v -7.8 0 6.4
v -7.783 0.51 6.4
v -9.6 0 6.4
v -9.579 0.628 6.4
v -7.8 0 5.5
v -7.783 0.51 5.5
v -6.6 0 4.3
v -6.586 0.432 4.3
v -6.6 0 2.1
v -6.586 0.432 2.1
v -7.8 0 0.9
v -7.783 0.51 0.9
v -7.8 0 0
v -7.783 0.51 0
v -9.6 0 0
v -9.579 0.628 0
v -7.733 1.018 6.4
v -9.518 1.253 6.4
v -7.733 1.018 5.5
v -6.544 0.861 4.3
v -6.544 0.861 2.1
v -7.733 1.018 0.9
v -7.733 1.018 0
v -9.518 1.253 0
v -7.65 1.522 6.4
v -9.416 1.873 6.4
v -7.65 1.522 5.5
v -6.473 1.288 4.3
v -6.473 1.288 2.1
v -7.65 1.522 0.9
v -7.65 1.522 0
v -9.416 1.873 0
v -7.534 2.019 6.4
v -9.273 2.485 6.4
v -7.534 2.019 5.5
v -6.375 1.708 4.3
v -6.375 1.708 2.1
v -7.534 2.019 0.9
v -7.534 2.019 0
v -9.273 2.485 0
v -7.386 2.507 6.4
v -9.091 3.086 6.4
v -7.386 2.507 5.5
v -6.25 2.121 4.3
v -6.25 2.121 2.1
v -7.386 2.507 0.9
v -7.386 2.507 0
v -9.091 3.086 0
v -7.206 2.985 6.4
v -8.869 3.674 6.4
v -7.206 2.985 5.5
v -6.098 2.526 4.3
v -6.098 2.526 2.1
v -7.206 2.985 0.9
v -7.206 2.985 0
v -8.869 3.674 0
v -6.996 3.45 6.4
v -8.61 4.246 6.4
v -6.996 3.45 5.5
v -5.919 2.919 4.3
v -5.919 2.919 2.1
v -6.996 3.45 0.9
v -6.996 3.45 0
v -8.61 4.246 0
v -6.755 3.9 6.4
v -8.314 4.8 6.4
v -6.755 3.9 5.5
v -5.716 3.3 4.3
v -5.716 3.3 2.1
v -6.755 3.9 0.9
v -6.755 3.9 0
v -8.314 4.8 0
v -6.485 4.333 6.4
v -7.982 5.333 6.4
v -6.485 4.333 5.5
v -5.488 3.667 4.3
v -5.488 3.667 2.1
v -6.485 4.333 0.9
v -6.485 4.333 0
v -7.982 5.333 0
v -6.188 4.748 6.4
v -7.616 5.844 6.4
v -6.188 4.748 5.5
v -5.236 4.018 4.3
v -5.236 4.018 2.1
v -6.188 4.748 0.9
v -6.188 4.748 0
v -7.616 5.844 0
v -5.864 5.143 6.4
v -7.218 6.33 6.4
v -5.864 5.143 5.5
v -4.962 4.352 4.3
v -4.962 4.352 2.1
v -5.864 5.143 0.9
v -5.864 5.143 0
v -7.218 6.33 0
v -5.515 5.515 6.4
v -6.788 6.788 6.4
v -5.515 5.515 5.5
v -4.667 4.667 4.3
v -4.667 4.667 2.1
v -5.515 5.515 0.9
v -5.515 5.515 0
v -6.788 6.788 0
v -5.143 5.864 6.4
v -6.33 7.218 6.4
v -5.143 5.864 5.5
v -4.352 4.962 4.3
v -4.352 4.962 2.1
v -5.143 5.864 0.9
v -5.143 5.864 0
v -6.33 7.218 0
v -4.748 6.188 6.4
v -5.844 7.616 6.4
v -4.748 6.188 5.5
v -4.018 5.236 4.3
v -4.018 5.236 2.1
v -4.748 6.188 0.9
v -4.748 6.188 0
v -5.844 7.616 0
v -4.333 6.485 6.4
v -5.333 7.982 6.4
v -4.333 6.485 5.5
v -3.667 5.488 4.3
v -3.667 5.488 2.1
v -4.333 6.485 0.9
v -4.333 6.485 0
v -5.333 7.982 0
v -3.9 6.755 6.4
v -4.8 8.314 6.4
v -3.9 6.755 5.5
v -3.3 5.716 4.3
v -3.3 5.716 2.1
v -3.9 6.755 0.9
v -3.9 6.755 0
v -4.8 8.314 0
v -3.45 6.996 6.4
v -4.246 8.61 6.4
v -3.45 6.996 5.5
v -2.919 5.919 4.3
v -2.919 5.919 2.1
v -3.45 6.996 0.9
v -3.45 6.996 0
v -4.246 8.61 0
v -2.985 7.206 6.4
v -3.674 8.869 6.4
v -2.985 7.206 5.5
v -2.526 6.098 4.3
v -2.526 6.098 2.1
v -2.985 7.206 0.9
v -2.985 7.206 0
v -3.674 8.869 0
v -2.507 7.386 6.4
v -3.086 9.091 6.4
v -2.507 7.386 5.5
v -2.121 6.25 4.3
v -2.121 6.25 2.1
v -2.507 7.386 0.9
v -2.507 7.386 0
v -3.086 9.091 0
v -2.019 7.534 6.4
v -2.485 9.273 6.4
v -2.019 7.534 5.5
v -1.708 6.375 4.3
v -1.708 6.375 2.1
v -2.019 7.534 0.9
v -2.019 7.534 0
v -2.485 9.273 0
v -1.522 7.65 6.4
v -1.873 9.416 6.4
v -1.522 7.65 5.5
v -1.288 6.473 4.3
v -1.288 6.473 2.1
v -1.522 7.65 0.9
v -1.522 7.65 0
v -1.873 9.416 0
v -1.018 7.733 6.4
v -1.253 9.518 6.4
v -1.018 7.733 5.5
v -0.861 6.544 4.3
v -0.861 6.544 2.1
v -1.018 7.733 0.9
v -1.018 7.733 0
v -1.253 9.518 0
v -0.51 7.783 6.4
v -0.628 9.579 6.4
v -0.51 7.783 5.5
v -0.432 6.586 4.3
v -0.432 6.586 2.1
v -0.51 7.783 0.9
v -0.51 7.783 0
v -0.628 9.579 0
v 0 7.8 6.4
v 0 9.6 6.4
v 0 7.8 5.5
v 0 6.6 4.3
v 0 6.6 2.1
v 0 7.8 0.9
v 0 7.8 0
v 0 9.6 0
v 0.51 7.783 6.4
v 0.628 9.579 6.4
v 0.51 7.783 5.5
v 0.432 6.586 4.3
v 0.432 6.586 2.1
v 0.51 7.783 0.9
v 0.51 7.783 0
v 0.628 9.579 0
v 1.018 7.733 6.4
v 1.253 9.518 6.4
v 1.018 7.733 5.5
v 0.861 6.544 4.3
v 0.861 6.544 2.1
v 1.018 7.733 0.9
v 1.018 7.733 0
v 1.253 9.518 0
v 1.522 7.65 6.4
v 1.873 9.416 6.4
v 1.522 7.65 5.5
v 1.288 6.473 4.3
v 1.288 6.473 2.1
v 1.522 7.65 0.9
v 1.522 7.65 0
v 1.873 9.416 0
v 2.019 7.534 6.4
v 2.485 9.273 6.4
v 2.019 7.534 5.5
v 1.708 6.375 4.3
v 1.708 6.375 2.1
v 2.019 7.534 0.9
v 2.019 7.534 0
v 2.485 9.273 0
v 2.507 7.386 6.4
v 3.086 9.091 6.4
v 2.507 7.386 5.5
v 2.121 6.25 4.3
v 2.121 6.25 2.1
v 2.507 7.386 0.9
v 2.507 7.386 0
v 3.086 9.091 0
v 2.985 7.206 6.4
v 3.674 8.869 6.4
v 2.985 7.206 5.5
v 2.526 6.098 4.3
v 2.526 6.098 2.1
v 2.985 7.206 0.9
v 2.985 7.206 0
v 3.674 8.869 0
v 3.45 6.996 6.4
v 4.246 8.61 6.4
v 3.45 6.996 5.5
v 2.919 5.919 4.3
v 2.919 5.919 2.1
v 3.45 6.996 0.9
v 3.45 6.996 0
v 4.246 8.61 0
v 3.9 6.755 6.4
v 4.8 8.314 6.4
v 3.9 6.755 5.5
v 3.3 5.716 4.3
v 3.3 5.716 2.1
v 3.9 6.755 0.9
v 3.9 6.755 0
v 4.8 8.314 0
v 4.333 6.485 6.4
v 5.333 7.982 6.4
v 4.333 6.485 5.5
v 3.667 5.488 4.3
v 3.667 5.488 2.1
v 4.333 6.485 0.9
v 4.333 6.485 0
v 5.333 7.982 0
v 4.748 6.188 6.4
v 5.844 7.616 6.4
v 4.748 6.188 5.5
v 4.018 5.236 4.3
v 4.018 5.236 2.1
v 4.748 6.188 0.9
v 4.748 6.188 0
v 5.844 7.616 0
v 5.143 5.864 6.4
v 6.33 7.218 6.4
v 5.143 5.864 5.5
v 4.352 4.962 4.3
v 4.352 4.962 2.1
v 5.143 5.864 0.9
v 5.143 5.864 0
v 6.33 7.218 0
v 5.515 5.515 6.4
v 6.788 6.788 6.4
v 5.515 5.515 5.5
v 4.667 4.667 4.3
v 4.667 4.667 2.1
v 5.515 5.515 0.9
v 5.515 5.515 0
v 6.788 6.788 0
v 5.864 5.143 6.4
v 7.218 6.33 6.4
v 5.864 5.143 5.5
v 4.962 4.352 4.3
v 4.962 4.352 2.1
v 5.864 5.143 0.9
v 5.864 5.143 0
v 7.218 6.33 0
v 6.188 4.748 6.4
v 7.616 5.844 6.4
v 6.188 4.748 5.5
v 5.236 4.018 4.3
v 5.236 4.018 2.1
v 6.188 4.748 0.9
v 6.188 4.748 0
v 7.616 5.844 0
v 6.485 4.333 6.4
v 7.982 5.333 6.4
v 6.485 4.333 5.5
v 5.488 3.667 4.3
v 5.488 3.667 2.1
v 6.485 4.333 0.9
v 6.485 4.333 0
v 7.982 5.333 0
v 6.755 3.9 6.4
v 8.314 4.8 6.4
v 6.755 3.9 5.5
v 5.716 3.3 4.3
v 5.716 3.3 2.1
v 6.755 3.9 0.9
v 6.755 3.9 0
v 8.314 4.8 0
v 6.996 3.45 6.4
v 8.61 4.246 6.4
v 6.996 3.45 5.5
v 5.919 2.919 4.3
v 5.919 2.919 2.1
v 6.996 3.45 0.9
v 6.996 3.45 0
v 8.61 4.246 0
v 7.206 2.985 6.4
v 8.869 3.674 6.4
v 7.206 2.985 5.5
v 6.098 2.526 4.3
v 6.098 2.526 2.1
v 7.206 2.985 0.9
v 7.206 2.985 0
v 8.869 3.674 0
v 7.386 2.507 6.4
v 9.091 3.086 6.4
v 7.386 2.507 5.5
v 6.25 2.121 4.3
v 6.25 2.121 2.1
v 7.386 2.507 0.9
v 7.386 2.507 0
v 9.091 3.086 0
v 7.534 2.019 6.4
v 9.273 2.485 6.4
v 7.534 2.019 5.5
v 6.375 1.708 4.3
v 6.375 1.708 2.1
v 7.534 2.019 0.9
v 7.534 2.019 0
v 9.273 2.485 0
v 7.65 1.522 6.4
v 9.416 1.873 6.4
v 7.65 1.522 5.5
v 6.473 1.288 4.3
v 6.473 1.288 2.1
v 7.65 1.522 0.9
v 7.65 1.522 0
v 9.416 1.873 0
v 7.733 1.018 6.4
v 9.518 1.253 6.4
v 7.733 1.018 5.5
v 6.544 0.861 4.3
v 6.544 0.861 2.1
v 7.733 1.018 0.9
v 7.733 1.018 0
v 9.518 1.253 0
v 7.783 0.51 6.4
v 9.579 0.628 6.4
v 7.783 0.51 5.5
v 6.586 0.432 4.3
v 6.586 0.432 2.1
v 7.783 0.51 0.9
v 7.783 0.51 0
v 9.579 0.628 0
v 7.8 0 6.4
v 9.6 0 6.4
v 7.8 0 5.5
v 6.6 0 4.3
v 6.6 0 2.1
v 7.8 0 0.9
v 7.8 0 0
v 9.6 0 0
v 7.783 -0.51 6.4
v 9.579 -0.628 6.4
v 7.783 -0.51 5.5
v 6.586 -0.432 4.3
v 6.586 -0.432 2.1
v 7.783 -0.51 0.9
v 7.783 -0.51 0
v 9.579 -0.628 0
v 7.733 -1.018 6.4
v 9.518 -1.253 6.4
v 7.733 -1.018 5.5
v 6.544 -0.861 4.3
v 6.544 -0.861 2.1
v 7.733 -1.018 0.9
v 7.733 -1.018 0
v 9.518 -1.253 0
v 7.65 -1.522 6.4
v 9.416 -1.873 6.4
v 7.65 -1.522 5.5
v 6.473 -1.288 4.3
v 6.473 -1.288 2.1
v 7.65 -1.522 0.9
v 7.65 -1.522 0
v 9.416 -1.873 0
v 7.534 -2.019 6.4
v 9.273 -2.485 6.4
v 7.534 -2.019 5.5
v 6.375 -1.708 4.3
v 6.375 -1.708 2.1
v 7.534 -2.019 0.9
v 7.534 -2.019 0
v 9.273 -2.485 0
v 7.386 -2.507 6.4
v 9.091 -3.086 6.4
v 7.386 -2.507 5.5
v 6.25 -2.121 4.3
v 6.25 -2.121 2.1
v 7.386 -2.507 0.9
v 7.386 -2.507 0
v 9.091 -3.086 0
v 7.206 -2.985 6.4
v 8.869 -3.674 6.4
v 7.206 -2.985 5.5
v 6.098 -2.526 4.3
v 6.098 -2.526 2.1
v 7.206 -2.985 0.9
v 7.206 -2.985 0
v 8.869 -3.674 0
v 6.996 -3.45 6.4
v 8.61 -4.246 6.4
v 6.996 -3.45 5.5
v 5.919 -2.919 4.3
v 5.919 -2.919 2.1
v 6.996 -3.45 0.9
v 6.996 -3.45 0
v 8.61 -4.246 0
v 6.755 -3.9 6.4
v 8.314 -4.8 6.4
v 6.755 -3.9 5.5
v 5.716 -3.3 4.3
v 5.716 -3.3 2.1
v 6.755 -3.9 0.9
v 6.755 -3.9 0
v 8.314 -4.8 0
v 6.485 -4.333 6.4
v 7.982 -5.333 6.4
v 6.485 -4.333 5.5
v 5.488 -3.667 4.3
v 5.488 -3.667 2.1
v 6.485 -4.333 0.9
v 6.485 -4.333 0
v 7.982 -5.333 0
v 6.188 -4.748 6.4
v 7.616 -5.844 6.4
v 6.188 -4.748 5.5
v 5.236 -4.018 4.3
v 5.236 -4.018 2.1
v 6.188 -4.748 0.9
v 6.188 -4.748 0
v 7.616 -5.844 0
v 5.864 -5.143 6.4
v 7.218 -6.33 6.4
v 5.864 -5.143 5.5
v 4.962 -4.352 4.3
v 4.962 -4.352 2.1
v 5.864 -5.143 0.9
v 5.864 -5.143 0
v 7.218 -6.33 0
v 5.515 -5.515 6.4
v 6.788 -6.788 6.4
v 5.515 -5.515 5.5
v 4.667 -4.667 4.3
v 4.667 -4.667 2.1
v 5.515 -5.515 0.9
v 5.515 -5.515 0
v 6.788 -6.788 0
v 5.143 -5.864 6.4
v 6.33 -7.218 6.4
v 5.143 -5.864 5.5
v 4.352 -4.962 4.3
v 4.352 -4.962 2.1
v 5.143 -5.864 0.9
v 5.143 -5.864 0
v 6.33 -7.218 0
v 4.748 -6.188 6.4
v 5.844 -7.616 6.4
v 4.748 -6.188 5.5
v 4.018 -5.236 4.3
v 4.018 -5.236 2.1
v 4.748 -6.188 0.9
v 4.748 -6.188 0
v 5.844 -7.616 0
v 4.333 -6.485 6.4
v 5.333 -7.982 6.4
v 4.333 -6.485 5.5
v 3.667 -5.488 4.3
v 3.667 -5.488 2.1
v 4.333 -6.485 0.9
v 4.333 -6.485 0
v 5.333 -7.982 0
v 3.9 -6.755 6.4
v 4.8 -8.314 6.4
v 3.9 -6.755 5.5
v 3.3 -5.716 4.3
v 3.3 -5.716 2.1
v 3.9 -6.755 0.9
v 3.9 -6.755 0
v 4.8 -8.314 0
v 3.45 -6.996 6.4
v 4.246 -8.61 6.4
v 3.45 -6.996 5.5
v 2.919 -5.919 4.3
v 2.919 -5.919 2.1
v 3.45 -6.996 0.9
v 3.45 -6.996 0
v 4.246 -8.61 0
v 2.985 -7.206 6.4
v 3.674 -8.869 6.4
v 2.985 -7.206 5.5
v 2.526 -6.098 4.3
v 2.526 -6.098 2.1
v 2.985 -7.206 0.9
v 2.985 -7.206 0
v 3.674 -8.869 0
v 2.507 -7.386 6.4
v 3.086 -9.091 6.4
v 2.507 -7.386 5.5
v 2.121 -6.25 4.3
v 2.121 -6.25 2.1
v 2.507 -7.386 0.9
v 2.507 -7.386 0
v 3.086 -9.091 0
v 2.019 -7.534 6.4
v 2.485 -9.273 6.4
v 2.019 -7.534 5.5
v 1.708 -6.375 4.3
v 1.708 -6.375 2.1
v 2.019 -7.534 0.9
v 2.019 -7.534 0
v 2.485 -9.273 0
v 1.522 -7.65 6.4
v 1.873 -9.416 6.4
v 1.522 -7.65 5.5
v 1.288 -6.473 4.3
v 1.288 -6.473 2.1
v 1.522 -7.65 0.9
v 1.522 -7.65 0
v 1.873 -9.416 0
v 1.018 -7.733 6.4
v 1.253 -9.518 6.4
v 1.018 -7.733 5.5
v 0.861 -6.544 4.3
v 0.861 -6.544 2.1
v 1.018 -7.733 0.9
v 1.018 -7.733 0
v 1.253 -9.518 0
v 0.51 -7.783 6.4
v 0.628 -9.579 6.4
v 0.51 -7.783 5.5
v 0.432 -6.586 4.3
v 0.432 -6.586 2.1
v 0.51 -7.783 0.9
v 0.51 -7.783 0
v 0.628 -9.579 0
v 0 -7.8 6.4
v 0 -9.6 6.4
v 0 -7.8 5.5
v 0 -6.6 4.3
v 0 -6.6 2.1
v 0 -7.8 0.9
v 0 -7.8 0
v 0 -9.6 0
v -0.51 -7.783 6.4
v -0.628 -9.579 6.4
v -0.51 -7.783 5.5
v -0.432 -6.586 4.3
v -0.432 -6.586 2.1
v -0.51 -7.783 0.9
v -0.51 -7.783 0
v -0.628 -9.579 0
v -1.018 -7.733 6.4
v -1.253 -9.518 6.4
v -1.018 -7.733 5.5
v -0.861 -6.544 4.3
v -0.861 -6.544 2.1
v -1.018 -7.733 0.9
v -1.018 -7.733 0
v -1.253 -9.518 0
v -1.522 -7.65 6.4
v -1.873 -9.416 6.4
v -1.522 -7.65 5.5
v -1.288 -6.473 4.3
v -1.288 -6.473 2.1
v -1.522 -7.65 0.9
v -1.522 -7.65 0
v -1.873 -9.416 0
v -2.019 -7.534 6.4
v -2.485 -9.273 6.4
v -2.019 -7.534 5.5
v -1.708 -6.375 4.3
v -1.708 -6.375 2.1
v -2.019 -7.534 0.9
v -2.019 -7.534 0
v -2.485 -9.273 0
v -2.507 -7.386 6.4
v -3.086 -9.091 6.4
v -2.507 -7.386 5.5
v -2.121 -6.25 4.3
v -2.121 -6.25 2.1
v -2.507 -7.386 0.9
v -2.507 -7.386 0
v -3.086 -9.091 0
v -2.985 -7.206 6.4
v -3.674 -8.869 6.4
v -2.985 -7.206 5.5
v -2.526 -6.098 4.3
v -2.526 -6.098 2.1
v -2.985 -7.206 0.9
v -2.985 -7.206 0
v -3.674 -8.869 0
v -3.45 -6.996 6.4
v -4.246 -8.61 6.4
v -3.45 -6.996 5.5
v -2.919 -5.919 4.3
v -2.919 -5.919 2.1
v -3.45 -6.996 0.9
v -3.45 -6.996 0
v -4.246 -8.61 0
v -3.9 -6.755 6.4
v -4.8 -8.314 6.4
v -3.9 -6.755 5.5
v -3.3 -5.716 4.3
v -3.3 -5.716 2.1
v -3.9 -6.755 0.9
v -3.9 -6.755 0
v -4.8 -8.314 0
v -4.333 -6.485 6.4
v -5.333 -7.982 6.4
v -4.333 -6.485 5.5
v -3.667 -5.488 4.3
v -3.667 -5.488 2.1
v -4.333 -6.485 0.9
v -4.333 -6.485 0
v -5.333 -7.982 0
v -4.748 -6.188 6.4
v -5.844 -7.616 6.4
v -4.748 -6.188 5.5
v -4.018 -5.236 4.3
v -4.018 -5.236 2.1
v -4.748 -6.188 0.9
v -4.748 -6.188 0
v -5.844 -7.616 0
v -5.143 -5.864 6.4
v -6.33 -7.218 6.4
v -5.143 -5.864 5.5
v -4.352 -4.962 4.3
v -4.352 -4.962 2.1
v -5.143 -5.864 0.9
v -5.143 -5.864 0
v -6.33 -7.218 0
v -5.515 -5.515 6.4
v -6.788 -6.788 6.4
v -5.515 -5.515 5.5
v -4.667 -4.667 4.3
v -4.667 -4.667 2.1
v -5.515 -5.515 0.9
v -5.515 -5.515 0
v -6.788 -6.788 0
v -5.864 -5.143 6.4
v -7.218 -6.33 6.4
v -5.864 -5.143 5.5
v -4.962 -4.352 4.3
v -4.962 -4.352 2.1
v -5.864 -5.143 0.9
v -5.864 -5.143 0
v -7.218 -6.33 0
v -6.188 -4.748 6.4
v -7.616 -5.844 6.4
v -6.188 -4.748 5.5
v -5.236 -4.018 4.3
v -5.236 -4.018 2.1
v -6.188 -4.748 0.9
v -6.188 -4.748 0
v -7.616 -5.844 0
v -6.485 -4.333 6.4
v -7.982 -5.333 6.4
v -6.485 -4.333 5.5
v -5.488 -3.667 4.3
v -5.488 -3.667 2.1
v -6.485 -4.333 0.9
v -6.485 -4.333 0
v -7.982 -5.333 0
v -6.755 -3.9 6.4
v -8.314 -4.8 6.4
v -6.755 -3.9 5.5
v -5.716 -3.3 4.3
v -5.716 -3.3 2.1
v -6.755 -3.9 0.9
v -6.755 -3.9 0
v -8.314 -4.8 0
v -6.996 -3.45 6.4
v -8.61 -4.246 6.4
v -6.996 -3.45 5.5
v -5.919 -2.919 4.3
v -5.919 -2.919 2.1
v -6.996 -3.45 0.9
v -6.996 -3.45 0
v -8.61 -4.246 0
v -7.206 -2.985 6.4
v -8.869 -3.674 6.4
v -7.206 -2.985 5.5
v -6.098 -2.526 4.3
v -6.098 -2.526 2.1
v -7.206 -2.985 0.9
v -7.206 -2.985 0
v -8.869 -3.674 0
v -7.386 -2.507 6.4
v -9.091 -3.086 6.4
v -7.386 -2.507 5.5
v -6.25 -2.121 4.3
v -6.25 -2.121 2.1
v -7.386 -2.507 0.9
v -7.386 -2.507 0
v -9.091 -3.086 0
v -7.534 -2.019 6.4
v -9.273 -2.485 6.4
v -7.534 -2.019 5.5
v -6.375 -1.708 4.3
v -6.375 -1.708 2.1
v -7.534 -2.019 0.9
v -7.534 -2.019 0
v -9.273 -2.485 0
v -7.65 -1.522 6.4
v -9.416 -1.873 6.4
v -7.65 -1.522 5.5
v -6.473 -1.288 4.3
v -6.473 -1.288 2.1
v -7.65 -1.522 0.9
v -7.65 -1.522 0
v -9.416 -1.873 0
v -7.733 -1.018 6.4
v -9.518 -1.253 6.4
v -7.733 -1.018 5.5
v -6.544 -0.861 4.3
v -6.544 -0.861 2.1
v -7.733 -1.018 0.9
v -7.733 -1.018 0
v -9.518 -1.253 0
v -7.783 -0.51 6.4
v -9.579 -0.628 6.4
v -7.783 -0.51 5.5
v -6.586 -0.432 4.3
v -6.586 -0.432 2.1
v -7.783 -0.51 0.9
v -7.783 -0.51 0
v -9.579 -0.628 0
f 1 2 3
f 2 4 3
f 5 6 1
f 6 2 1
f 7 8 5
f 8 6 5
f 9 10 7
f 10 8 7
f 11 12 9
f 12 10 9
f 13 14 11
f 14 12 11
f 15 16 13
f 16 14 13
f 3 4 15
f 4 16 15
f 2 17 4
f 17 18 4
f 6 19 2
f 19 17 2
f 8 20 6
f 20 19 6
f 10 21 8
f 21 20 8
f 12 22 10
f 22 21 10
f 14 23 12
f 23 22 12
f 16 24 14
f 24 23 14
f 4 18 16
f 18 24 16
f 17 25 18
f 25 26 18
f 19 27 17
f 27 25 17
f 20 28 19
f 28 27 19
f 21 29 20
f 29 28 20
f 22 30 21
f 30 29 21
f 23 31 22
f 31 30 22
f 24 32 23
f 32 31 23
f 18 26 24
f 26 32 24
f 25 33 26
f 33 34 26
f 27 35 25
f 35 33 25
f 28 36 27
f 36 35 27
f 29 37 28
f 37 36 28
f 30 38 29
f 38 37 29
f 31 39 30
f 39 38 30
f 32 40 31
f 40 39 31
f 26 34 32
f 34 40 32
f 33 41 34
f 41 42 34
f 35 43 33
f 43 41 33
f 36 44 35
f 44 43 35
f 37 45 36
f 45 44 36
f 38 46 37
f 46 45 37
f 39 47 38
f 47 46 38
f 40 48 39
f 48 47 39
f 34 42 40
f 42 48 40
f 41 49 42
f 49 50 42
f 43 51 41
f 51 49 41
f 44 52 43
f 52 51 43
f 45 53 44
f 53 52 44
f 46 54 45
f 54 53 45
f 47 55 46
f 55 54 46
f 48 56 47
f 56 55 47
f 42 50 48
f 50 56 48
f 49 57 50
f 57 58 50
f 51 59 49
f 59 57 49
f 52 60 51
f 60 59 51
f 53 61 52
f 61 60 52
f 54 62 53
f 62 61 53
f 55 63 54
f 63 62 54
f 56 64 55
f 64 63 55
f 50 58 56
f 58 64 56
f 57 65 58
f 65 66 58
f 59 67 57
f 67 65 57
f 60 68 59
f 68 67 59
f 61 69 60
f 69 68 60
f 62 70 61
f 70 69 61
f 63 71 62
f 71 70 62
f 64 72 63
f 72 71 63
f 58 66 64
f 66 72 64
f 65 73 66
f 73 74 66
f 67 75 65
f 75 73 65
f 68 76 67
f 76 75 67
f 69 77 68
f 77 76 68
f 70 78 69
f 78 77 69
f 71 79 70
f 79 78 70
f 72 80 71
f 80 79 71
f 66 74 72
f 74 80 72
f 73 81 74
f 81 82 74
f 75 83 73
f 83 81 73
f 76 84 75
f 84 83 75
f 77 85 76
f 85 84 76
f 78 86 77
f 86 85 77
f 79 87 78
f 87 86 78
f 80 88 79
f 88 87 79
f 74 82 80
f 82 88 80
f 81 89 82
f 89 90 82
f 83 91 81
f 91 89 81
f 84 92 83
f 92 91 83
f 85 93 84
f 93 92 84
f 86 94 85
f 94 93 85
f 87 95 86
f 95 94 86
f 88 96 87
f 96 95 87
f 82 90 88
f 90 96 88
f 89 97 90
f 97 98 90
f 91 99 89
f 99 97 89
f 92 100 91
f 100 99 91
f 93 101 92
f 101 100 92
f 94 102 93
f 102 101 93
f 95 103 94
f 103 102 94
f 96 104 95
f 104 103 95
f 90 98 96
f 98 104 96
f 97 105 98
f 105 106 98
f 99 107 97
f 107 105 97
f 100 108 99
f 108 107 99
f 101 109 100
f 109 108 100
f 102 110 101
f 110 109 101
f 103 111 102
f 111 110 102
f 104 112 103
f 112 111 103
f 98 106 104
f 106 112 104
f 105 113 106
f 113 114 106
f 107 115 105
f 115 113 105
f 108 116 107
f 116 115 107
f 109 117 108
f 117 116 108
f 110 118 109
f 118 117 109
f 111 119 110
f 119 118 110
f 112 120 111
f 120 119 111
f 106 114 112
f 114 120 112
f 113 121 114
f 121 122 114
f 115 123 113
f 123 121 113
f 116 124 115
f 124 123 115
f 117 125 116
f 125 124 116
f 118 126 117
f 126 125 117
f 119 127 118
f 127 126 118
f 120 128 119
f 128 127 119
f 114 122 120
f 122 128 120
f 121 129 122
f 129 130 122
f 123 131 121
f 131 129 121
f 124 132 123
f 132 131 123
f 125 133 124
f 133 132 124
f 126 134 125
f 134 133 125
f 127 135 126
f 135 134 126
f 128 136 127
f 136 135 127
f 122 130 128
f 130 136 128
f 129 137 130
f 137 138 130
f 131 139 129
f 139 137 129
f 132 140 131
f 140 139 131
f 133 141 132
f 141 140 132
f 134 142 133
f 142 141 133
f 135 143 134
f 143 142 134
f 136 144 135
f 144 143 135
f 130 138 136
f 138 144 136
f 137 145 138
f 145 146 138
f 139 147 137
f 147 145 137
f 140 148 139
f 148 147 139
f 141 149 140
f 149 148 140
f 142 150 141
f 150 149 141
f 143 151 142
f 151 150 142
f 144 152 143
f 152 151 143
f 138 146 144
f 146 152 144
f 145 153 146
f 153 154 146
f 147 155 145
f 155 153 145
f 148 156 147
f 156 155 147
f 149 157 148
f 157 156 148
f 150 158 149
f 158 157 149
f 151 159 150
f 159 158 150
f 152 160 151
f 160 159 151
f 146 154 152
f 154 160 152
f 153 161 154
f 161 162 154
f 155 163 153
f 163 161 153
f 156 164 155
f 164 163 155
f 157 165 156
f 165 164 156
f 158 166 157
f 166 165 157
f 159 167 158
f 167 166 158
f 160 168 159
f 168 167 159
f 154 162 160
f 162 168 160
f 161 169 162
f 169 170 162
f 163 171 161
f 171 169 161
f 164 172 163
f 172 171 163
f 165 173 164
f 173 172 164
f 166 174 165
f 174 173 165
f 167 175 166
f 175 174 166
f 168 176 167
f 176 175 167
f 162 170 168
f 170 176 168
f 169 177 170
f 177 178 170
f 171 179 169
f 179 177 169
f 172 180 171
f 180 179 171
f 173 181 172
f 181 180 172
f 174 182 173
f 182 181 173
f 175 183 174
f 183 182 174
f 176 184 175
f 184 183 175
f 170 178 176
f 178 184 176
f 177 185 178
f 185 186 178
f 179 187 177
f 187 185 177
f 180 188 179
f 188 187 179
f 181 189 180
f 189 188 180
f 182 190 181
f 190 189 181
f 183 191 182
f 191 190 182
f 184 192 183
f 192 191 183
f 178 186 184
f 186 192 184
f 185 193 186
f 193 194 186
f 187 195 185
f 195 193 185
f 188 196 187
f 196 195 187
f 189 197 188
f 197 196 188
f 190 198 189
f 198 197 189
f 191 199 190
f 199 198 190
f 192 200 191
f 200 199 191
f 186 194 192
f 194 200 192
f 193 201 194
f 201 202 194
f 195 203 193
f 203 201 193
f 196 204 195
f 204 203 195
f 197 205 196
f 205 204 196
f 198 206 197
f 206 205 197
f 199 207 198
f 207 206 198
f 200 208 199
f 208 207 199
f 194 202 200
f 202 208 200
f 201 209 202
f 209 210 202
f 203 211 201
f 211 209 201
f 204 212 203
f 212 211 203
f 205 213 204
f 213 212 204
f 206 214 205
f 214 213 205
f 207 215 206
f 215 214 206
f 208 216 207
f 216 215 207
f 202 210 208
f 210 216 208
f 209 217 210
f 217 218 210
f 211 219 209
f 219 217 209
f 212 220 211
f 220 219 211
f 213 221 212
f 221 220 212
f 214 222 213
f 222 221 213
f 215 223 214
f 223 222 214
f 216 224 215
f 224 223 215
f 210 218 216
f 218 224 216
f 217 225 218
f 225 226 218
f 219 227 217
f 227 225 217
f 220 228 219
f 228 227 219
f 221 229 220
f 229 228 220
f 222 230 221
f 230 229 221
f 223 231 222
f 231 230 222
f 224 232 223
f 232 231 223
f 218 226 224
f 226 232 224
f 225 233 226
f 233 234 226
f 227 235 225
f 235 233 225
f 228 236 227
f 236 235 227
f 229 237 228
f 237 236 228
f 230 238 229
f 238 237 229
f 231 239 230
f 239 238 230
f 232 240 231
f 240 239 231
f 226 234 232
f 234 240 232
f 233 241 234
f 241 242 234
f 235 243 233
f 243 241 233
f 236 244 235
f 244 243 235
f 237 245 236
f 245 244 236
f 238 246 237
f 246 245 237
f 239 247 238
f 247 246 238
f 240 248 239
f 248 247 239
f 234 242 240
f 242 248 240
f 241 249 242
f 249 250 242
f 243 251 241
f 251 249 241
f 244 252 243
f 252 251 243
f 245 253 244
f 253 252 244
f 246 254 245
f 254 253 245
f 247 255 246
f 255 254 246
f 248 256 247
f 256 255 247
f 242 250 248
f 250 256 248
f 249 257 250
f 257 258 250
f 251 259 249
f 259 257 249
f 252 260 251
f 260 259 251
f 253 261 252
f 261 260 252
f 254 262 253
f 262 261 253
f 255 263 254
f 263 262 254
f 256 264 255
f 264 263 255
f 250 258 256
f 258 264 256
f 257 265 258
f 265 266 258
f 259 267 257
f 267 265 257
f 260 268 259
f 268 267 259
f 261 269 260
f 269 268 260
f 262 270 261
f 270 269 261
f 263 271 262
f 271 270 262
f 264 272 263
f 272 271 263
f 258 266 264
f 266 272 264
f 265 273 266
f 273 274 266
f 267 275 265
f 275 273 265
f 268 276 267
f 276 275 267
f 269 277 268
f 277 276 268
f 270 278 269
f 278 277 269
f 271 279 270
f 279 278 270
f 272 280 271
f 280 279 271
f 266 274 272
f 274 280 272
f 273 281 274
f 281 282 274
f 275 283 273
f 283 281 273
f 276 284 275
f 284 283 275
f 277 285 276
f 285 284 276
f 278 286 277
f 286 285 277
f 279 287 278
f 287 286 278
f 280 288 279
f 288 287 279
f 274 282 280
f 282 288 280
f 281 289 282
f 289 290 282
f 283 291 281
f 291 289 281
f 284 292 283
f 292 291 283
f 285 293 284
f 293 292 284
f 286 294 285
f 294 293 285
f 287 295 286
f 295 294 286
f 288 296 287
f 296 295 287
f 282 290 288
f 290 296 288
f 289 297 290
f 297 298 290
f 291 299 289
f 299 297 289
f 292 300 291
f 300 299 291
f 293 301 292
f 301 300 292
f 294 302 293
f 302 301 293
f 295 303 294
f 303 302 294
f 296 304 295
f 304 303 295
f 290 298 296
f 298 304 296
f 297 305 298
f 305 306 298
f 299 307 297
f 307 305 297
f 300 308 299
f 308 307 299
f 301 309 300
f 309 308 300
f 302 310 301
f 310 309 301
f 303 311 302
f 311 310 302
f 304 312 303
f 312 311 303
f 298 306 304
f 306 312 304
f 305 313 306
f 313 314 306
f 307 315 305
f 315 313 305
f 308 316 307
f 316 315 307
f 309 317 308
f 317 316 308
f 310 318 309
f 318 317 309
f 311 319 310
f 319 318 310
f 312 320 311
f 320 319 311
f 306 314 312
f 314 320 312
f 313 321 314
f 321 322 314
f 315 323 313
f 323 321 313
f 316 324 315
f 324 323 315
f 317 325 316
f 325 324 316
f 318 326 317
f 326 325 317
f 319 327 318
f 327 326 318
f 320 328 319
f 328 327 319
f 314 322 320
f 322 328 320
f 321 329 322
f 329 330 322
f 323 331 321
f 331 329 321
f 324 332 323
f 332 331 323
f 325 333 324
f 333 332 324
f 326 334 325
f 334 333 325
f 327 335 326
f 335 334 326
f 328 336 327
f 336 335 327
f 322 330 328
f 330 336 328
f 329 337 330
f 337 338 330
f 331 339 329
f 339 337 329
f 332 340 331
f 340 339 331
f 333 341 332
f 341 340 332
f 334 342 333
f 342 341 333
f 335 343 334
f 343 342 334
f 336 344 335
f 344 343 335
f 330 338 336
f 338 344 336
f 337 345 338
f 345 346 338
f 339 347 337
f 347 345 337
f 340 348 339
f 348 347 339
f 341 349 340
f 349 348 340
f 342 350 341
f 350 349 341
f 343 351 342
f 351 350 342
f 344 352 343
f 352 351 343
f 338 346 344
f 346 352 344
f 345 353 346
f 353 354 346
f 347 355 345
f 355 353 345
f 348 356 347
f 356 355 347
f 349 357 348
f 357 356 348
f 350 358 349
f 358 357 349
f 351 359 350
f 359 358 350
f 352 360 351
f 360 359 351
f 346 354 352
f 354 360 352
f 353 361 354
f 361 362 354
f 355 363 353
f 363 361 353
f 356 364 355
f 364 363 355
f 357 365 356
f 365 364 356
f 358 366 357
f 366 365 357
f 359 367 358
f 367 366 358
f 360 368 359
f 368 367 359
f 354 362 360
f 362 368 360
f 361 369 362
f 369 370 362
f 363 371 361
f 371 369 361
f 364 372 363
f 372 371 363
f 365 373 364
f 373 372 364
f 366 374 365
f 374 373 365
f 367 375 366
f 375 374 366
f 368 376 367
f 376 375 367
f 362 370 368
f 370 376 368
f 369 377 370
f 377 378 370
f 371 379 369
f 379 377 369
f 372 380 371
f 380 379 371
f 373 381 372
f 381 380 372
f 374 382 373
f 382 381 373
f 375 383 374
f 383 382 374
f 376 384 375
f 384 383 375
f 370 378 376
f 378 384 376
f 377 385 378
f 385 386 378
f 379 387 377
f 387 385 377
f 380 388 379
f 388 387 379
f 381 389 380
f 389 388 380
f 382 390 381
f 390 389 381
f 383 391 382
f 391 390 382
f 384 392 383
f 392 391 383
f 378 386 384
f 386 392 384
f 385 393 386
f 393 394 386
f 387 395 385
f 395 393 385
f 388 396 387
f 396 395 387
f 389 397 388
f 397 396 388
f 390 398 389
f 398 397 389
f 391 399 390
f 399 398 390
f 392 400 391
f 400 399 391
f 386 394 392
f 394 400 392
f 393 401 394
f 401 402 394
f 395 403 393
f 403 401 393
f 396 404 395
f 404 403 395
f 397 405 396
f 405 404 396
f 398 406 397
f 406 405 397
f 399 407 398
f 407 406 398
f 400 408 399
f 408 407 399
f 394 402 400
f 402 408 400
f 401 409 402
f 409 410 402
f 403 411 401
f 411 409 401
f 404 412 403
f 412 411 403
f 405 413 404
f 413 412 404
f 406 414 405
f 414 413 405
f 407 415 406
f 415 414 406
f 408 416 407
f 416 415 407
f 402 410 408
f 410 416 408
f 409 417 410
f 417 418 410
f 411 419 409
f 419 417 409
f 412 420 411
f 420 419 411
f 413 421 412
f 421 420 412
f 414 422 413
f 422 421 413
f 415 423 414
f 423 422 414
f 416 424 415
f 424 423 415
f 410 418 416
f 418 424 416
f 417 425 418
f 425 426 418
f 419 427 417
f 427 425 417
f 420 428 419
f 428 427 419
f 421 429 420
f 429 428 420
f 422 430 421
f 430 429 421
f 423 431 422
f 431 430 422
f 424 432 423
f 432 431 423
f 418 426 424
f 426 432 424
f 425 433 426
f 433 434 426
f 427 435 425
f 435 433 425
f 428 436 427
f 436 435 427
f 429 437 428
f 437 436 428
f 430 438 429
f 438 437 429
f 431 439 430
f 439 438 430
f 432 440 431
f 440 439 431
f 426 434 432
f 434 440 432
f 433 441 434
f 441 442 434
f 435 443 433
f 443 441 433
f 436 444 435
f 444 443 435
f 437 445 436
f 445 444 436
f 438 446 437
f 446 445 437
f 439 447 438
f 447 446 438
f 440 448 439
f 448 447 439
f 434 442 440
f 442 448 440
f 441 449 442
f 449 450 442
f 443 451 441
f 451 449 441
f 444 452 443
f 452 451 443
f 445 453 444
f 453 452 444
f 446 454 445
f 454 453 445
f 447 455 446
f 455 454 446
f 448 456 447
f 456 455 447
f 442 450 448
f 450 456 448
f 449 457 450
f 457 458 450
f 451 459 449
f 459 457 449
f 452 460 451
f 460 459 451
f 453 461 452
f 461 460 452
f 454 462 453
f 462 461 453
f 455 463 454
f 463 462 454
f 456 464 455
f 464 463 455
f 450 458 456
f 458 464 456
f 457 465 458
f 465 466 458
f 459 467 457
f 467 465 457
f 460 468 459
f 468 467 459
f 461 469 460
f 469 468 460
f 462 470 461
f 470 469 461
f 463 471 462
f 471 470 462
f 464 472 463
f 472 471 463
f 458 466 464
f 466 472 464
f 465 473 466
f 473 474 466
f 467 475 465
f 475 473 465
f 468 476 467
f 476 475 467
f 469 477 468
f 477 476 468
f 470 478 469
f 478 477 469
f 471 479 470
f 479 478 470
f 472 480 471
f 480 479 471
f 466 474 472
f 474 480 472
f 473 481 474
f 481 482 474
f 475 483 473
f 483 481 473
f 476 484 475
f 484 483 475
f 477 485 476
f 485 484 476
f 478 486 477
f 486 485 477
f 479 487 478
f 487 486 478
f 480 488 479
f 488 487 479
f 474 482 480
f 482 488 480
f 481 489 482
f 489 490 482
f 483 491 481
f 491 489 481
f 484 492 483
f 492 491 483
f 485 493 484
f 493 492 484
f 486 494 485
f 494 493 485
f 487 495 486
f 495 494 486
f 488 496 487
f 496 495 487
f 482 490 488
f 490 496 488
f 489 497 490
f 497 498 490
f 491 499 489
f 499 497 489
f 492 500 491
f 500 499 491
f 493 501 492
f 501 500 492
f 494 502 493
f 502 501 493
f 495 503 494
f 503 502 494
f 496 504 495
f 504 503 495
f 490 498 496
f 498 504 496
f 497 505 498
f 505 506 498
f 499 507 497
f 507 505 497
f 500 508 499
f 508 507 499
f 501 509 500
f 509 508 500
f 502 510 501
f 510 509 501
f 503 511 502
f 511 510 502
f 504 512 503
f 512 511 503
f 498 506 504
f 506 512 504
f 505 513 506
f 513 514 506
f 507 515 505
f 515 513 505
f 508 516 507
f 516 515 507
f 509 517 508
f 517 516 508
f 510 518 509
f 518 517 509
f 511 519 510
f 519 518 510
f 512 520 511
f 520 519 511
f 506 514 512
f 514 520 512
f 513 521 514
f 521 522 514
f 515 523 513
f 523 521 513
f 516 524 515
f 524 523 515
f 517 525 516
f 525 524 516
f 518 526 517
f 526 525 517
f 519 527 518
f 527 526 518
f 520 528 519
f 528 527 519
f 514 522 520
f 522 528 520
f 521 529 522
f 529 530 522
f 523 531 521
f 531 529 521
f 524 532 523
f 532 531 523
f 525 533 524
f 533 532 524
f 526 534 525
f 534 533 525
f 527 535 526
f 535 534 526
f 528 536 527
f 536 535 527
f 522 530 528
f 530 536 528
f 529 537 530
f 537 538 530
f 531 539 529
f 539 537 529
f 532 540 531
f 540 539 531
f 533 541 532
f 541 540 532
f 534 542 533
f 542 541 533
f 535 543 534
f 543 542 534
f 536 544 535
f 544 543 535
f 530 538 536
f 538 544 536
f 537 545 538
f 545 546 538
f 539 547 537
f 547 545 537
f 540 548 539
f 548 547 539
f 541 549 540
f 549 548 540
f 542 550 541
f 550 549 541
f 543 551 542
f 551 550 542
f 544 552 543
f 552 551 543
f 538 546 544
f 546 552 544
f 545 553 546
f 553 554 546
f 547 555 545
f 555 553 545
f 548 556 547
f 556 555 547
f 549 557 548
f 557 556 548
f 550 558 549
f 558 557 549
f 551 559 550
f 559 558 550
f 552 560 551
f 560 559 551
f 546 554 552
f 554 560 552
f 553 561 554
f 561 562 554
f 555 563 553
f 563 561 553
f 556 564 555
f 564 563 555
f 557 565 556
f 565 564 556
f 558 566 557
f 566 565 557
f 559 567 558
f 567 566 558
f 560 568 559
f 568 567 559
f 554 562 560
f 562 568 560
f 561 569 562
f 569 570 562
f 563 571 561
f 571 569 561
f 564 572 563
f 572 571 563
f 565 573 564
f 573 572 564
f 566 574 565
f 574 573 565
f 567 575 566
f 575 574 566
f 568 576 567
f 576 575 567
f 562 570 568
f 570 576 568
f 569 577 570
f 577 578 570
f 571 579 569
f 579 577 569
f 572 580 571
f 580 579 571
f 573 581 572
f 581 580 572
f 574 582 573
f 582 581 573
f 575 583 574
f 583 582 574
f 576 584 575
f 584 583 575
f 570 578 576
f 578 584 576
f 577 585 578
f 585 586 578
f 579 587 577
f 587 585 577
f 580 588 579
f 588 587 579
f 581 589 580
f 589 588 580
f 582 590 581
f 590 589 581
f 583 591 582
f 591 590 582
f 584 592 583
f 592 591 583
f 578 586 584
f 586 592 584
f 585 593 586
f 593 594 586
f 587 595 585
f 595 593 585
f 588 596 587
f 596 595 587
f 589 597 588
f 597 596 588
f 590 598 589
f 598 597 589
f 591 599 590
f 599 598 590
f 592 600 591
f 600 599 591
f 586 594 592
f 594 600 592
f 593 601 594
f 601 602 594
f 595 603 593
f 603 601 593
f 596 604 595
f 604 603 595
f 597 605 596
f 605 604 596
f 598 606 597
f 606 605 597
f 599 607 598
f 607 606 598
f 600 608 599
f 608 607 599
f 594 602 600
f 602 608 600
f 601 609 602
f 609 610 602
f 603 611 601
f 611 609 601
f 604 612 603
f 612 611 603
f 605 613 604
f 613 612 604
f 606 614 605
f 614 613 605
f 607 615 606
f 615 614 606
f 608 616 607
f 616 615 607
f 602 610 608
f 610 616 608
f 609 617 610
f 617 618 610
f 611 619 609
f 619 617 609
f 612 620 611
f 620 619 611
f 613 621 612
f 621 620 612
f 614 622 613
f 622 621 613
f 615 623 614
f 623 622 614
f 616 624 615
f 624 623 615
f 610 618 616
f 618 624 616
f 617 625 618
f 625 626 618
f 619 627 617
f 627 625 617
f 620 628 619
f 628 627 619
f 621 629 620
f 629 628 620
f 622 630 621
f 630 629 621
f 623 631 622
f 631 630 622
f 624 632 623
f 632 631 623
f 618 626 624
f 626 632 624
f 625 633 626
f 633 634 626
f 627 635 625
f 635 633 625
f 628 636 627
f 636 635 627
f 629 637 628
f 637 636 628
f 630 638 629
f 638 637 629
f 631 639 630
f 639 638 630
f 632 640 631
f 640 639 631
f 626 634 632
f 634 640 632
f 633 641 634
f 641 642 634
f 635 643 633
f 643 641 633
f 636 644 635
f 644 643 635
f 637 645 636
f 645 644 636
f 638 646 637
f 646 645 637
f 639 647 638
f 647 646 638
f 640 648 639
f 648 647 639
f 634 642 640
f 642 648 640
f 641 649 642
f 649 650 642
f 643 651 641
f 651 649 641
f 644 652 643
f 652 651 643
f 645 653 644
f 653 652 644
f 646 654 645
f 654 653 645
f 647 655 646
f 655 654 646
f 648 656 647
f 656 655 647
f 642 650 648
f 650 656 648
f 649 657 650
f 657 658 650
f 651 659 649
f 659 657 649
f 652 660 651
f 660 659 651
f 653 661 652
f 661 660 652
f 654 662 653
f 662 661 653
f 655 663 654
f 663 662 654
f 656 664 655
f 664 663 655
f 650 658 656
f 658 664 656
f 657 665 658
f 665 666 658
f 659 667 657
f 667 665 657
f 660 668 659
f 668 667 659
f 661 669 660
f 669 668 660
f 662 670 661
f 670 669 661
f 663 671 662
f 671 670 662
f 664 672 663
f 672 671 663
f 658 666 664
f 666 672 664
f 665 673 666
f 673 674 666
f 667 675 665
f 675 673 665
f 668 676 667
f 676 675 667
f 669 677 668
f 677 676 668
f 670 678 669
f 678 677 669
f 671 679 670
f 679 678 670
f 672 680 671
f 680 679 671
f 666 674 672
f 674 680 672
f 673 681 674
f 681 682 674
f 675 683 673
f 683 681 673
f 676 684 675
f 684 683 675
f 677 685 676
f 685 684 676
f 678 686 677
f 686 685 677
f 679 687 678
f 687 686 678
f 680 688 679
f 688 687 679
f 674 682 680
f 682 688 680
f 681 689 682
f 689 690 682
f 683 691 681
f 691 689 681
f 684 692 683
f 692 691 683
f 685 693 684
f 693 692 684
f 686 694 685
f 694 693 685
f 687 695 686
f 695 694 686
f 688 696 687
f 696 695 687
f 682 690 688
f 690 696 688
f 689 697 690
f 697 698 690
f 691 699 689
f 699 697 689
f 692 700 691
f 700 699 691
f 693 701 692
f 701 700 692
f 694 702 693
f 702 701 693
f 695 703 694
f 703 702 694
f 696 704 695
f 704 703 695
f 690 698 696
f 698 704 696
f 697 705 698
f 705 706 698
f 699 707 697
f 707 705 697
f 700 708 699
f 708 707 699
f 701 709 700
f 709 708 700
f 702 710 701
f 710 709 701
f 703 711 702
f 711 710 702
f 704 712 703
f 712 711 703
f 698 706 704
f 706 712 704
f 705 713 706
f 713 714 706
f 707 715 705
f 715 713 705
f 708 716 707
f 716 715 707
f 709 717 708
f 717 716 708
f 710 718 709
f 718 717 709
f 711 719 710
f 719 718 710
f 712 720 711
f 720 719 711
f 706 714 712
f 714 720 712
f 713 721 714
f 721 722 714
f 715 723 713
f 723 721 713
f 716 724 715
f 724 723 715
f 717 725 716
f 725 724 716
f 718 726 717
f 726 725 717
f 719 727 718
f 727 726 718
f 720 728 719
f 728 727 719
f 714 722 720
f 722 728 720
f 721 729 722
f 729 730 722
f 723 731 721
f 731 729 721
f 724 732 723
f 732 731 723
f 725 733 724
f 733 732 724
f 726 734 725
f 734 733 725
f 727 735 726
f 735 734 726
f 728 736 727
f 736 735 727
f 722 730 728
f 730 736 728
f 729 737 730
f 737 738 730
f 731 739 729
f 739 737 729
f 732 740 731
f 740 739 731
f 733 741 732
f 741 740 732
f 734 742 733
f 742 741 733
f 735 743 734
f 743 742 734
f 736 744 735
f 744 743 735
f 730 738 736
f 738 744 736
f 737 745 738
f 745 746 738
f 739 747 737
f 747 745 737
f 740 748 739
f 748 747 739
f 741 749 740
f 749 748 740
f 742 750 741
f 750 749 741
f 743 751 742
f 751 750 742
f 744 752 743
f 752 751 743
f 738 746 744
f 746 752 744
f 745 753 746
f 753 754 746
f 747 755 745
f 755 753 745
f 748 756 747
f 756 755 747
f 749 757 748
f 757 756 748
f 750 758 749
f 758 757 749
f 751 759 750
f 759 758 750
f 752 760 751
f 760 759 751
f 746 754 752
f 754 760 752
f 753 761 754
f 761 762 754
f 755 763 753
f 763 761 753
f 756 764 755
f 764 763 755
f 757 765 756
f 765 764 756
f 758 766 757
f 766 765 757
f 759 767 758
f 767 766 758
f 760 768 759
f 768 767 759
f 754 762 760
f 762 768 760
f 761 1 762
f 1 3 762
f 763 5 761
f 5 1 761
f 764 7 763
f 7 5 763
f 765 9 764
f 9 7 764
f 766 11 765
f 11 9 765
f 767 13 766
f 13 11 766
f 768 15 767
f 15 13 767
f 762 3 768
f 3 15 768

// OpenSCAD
// file: ../config.scad
// =====================================================================
//  Brick system: global configuration
//
//  Every grid and fit value from SPEC.md lives here. Values marked
//  [fit] are the ones to re-tune per printer/filament with the
//  calibration coupon (parts.scad -> coupon()). Override any of them
//  from the command line without editing this file:
//
//    openscad -D 'RIB_D=4.8' -o plate.stl examples/plates.scad
//
//  All lengths in mm. Designed for a 0.4 mm nozzle and 0.2 mm layers.
// =====================================================================

$fn = 64;
eps = 0.01;               // overlap for clean booleans (not a real dimension)
FONT = "DejaVu Sans:style=Bold";

// ---------- print process ----------
LINE   = 0.45;            // extrusion width; walls are multiples (see WALL_*)
LAYER  = 0.2;             // layer height; heights are multiples of this
WALL_1 = 0.9;             // 2 lines, the minimum anywhere
WALL_2 = 1.3;             // 3 lines
WALL_3 = 1.8;             // 4 lines
BRIDGE_MAX = 6.0;         // longest flat bridge allowed

// ---------- grid ----------
PITCH = 8.0;              // horizontal grid
PLATE = 3.2;              // plate height
BRICK = 9.6;              // 3 plates
GAP   = 0.1;              // per side; outer size = n*8 - 0.2

// ---------- connector 1: stud + crush-rib socket ----------
STUD_D        = 5.0;
STUD_H        = 1.6;
STUD_CHAMFER  = 0.4;      // lead-in on top of stud
STUD_FILLET   = 0.4;      // root fillet against layer-line breakage
SOCKET_D      = 5.4;      // bore: 0.2 mm clearance per side before ribs
SOCKET_DEPTH  = 1.8;      // leaves a 1.4 mm roof in a 3.2 mm plate
SOCKET_CHAMF  = 0.4;      // entry chamfer (also hides elephant's foot)
RIB_R         = 0.5;      // rib = vertical half-cylinder
RIB_N         = 4;
RIB_D         = 4.75;     // [fit] diameter across rib tips (4.8 / 4.7 tested good)
ROOF          = PLATE - SOCKET_DEPTH;   // 1.4 mm of material above a socket in a plate

// ---------- connector 2: slot + flat clip ----------
CLIP_T      = 2.0;        // thickness (Z when printed flat)
CLIP_W      = 5.0;        // body width
CLIP_HALF   = 3.4;        // engagement depth per side (clip length 6.8)
CLIP_ARM    = 0.9;        // spring arm width (2 lines)
CLIP_BAND   = 0.8;        // solid centre band
BARB        = 0.3;        // barb height above body width, per side
BARB_LEAD   = 0.15;       // chamfer at arm tip
CLIP_ROOT_R = 0.3;        // fillet radius at the arm roots
SLOT_CLEAR  = 0.15;       // [fit] clearance per side in the thickness direction
SLOT_INTERF = 0.10;       // [fit] barb interference per side
SLOT_T      = CLIP_T + 2*SLOT_CLEAR;   // 2.3
SLOT_DEPTH  = CLIP_HALF + 0.2;         // 3.6
SLOT_CHAMF  = 0.4;        // entry chamfer of top-face slots
SIDE_SLOT_MIN_H = 2*PLATE;             // parts lower than 6.4 get no side slots
function slot_len(interf = SLOT_INTERF) = CLIP_W + 2*(BARB - interf);   // 5.4

// ---------- axles ----------
AXLE_D       = 3.0;       // steel rod / M3 screw
BORE_SPIN_D  = 3.2;       // [fit] free-running teardrop bore (3.3 too wobbly)
BORE_GRIP_D  = 2.8;       // [fit] diameter across rib tips of a grip bore
GRIP_BORE_D  = 3.4;       // base bore under the grip ribs
AXLE_FLAT    = 0.3;       // flat on the bed side of a printed axle

// ---------- part design values (not connector fits) ----------
HINGE_CLEAR    = 0.3;     // gap between interleaved hinge knuckles, radial and axial
WHEEL_CHANNEL  = 1.2;     // depth of the tyre channel in a wheel rim
TIRE_STRETCH   = 0.2;     // tyre inner radius is this much smaller than the channel (TPU)

// ---------- helpers ----------
function cell(i) = PITCH*i + PITCH/2;          // centre of grid cell i
function snap_layer(h) = round(h / LAYER) * LAYER;
// main file
// TPU tyre for a wheel with tread = "tire" (same d and w).
include <../parts.scad>

/* [Tyre] */
// Rim diameter of the wheel (mm)
d = 16; // [10:0.2:80]
// Wheel width (mm)
w = 6.4; // [3.2:0.2:30]
// Tread thickness (mm)
t = 1.6; // [0.8:0.2:6]

tire(d = d, w = w, t = t);
